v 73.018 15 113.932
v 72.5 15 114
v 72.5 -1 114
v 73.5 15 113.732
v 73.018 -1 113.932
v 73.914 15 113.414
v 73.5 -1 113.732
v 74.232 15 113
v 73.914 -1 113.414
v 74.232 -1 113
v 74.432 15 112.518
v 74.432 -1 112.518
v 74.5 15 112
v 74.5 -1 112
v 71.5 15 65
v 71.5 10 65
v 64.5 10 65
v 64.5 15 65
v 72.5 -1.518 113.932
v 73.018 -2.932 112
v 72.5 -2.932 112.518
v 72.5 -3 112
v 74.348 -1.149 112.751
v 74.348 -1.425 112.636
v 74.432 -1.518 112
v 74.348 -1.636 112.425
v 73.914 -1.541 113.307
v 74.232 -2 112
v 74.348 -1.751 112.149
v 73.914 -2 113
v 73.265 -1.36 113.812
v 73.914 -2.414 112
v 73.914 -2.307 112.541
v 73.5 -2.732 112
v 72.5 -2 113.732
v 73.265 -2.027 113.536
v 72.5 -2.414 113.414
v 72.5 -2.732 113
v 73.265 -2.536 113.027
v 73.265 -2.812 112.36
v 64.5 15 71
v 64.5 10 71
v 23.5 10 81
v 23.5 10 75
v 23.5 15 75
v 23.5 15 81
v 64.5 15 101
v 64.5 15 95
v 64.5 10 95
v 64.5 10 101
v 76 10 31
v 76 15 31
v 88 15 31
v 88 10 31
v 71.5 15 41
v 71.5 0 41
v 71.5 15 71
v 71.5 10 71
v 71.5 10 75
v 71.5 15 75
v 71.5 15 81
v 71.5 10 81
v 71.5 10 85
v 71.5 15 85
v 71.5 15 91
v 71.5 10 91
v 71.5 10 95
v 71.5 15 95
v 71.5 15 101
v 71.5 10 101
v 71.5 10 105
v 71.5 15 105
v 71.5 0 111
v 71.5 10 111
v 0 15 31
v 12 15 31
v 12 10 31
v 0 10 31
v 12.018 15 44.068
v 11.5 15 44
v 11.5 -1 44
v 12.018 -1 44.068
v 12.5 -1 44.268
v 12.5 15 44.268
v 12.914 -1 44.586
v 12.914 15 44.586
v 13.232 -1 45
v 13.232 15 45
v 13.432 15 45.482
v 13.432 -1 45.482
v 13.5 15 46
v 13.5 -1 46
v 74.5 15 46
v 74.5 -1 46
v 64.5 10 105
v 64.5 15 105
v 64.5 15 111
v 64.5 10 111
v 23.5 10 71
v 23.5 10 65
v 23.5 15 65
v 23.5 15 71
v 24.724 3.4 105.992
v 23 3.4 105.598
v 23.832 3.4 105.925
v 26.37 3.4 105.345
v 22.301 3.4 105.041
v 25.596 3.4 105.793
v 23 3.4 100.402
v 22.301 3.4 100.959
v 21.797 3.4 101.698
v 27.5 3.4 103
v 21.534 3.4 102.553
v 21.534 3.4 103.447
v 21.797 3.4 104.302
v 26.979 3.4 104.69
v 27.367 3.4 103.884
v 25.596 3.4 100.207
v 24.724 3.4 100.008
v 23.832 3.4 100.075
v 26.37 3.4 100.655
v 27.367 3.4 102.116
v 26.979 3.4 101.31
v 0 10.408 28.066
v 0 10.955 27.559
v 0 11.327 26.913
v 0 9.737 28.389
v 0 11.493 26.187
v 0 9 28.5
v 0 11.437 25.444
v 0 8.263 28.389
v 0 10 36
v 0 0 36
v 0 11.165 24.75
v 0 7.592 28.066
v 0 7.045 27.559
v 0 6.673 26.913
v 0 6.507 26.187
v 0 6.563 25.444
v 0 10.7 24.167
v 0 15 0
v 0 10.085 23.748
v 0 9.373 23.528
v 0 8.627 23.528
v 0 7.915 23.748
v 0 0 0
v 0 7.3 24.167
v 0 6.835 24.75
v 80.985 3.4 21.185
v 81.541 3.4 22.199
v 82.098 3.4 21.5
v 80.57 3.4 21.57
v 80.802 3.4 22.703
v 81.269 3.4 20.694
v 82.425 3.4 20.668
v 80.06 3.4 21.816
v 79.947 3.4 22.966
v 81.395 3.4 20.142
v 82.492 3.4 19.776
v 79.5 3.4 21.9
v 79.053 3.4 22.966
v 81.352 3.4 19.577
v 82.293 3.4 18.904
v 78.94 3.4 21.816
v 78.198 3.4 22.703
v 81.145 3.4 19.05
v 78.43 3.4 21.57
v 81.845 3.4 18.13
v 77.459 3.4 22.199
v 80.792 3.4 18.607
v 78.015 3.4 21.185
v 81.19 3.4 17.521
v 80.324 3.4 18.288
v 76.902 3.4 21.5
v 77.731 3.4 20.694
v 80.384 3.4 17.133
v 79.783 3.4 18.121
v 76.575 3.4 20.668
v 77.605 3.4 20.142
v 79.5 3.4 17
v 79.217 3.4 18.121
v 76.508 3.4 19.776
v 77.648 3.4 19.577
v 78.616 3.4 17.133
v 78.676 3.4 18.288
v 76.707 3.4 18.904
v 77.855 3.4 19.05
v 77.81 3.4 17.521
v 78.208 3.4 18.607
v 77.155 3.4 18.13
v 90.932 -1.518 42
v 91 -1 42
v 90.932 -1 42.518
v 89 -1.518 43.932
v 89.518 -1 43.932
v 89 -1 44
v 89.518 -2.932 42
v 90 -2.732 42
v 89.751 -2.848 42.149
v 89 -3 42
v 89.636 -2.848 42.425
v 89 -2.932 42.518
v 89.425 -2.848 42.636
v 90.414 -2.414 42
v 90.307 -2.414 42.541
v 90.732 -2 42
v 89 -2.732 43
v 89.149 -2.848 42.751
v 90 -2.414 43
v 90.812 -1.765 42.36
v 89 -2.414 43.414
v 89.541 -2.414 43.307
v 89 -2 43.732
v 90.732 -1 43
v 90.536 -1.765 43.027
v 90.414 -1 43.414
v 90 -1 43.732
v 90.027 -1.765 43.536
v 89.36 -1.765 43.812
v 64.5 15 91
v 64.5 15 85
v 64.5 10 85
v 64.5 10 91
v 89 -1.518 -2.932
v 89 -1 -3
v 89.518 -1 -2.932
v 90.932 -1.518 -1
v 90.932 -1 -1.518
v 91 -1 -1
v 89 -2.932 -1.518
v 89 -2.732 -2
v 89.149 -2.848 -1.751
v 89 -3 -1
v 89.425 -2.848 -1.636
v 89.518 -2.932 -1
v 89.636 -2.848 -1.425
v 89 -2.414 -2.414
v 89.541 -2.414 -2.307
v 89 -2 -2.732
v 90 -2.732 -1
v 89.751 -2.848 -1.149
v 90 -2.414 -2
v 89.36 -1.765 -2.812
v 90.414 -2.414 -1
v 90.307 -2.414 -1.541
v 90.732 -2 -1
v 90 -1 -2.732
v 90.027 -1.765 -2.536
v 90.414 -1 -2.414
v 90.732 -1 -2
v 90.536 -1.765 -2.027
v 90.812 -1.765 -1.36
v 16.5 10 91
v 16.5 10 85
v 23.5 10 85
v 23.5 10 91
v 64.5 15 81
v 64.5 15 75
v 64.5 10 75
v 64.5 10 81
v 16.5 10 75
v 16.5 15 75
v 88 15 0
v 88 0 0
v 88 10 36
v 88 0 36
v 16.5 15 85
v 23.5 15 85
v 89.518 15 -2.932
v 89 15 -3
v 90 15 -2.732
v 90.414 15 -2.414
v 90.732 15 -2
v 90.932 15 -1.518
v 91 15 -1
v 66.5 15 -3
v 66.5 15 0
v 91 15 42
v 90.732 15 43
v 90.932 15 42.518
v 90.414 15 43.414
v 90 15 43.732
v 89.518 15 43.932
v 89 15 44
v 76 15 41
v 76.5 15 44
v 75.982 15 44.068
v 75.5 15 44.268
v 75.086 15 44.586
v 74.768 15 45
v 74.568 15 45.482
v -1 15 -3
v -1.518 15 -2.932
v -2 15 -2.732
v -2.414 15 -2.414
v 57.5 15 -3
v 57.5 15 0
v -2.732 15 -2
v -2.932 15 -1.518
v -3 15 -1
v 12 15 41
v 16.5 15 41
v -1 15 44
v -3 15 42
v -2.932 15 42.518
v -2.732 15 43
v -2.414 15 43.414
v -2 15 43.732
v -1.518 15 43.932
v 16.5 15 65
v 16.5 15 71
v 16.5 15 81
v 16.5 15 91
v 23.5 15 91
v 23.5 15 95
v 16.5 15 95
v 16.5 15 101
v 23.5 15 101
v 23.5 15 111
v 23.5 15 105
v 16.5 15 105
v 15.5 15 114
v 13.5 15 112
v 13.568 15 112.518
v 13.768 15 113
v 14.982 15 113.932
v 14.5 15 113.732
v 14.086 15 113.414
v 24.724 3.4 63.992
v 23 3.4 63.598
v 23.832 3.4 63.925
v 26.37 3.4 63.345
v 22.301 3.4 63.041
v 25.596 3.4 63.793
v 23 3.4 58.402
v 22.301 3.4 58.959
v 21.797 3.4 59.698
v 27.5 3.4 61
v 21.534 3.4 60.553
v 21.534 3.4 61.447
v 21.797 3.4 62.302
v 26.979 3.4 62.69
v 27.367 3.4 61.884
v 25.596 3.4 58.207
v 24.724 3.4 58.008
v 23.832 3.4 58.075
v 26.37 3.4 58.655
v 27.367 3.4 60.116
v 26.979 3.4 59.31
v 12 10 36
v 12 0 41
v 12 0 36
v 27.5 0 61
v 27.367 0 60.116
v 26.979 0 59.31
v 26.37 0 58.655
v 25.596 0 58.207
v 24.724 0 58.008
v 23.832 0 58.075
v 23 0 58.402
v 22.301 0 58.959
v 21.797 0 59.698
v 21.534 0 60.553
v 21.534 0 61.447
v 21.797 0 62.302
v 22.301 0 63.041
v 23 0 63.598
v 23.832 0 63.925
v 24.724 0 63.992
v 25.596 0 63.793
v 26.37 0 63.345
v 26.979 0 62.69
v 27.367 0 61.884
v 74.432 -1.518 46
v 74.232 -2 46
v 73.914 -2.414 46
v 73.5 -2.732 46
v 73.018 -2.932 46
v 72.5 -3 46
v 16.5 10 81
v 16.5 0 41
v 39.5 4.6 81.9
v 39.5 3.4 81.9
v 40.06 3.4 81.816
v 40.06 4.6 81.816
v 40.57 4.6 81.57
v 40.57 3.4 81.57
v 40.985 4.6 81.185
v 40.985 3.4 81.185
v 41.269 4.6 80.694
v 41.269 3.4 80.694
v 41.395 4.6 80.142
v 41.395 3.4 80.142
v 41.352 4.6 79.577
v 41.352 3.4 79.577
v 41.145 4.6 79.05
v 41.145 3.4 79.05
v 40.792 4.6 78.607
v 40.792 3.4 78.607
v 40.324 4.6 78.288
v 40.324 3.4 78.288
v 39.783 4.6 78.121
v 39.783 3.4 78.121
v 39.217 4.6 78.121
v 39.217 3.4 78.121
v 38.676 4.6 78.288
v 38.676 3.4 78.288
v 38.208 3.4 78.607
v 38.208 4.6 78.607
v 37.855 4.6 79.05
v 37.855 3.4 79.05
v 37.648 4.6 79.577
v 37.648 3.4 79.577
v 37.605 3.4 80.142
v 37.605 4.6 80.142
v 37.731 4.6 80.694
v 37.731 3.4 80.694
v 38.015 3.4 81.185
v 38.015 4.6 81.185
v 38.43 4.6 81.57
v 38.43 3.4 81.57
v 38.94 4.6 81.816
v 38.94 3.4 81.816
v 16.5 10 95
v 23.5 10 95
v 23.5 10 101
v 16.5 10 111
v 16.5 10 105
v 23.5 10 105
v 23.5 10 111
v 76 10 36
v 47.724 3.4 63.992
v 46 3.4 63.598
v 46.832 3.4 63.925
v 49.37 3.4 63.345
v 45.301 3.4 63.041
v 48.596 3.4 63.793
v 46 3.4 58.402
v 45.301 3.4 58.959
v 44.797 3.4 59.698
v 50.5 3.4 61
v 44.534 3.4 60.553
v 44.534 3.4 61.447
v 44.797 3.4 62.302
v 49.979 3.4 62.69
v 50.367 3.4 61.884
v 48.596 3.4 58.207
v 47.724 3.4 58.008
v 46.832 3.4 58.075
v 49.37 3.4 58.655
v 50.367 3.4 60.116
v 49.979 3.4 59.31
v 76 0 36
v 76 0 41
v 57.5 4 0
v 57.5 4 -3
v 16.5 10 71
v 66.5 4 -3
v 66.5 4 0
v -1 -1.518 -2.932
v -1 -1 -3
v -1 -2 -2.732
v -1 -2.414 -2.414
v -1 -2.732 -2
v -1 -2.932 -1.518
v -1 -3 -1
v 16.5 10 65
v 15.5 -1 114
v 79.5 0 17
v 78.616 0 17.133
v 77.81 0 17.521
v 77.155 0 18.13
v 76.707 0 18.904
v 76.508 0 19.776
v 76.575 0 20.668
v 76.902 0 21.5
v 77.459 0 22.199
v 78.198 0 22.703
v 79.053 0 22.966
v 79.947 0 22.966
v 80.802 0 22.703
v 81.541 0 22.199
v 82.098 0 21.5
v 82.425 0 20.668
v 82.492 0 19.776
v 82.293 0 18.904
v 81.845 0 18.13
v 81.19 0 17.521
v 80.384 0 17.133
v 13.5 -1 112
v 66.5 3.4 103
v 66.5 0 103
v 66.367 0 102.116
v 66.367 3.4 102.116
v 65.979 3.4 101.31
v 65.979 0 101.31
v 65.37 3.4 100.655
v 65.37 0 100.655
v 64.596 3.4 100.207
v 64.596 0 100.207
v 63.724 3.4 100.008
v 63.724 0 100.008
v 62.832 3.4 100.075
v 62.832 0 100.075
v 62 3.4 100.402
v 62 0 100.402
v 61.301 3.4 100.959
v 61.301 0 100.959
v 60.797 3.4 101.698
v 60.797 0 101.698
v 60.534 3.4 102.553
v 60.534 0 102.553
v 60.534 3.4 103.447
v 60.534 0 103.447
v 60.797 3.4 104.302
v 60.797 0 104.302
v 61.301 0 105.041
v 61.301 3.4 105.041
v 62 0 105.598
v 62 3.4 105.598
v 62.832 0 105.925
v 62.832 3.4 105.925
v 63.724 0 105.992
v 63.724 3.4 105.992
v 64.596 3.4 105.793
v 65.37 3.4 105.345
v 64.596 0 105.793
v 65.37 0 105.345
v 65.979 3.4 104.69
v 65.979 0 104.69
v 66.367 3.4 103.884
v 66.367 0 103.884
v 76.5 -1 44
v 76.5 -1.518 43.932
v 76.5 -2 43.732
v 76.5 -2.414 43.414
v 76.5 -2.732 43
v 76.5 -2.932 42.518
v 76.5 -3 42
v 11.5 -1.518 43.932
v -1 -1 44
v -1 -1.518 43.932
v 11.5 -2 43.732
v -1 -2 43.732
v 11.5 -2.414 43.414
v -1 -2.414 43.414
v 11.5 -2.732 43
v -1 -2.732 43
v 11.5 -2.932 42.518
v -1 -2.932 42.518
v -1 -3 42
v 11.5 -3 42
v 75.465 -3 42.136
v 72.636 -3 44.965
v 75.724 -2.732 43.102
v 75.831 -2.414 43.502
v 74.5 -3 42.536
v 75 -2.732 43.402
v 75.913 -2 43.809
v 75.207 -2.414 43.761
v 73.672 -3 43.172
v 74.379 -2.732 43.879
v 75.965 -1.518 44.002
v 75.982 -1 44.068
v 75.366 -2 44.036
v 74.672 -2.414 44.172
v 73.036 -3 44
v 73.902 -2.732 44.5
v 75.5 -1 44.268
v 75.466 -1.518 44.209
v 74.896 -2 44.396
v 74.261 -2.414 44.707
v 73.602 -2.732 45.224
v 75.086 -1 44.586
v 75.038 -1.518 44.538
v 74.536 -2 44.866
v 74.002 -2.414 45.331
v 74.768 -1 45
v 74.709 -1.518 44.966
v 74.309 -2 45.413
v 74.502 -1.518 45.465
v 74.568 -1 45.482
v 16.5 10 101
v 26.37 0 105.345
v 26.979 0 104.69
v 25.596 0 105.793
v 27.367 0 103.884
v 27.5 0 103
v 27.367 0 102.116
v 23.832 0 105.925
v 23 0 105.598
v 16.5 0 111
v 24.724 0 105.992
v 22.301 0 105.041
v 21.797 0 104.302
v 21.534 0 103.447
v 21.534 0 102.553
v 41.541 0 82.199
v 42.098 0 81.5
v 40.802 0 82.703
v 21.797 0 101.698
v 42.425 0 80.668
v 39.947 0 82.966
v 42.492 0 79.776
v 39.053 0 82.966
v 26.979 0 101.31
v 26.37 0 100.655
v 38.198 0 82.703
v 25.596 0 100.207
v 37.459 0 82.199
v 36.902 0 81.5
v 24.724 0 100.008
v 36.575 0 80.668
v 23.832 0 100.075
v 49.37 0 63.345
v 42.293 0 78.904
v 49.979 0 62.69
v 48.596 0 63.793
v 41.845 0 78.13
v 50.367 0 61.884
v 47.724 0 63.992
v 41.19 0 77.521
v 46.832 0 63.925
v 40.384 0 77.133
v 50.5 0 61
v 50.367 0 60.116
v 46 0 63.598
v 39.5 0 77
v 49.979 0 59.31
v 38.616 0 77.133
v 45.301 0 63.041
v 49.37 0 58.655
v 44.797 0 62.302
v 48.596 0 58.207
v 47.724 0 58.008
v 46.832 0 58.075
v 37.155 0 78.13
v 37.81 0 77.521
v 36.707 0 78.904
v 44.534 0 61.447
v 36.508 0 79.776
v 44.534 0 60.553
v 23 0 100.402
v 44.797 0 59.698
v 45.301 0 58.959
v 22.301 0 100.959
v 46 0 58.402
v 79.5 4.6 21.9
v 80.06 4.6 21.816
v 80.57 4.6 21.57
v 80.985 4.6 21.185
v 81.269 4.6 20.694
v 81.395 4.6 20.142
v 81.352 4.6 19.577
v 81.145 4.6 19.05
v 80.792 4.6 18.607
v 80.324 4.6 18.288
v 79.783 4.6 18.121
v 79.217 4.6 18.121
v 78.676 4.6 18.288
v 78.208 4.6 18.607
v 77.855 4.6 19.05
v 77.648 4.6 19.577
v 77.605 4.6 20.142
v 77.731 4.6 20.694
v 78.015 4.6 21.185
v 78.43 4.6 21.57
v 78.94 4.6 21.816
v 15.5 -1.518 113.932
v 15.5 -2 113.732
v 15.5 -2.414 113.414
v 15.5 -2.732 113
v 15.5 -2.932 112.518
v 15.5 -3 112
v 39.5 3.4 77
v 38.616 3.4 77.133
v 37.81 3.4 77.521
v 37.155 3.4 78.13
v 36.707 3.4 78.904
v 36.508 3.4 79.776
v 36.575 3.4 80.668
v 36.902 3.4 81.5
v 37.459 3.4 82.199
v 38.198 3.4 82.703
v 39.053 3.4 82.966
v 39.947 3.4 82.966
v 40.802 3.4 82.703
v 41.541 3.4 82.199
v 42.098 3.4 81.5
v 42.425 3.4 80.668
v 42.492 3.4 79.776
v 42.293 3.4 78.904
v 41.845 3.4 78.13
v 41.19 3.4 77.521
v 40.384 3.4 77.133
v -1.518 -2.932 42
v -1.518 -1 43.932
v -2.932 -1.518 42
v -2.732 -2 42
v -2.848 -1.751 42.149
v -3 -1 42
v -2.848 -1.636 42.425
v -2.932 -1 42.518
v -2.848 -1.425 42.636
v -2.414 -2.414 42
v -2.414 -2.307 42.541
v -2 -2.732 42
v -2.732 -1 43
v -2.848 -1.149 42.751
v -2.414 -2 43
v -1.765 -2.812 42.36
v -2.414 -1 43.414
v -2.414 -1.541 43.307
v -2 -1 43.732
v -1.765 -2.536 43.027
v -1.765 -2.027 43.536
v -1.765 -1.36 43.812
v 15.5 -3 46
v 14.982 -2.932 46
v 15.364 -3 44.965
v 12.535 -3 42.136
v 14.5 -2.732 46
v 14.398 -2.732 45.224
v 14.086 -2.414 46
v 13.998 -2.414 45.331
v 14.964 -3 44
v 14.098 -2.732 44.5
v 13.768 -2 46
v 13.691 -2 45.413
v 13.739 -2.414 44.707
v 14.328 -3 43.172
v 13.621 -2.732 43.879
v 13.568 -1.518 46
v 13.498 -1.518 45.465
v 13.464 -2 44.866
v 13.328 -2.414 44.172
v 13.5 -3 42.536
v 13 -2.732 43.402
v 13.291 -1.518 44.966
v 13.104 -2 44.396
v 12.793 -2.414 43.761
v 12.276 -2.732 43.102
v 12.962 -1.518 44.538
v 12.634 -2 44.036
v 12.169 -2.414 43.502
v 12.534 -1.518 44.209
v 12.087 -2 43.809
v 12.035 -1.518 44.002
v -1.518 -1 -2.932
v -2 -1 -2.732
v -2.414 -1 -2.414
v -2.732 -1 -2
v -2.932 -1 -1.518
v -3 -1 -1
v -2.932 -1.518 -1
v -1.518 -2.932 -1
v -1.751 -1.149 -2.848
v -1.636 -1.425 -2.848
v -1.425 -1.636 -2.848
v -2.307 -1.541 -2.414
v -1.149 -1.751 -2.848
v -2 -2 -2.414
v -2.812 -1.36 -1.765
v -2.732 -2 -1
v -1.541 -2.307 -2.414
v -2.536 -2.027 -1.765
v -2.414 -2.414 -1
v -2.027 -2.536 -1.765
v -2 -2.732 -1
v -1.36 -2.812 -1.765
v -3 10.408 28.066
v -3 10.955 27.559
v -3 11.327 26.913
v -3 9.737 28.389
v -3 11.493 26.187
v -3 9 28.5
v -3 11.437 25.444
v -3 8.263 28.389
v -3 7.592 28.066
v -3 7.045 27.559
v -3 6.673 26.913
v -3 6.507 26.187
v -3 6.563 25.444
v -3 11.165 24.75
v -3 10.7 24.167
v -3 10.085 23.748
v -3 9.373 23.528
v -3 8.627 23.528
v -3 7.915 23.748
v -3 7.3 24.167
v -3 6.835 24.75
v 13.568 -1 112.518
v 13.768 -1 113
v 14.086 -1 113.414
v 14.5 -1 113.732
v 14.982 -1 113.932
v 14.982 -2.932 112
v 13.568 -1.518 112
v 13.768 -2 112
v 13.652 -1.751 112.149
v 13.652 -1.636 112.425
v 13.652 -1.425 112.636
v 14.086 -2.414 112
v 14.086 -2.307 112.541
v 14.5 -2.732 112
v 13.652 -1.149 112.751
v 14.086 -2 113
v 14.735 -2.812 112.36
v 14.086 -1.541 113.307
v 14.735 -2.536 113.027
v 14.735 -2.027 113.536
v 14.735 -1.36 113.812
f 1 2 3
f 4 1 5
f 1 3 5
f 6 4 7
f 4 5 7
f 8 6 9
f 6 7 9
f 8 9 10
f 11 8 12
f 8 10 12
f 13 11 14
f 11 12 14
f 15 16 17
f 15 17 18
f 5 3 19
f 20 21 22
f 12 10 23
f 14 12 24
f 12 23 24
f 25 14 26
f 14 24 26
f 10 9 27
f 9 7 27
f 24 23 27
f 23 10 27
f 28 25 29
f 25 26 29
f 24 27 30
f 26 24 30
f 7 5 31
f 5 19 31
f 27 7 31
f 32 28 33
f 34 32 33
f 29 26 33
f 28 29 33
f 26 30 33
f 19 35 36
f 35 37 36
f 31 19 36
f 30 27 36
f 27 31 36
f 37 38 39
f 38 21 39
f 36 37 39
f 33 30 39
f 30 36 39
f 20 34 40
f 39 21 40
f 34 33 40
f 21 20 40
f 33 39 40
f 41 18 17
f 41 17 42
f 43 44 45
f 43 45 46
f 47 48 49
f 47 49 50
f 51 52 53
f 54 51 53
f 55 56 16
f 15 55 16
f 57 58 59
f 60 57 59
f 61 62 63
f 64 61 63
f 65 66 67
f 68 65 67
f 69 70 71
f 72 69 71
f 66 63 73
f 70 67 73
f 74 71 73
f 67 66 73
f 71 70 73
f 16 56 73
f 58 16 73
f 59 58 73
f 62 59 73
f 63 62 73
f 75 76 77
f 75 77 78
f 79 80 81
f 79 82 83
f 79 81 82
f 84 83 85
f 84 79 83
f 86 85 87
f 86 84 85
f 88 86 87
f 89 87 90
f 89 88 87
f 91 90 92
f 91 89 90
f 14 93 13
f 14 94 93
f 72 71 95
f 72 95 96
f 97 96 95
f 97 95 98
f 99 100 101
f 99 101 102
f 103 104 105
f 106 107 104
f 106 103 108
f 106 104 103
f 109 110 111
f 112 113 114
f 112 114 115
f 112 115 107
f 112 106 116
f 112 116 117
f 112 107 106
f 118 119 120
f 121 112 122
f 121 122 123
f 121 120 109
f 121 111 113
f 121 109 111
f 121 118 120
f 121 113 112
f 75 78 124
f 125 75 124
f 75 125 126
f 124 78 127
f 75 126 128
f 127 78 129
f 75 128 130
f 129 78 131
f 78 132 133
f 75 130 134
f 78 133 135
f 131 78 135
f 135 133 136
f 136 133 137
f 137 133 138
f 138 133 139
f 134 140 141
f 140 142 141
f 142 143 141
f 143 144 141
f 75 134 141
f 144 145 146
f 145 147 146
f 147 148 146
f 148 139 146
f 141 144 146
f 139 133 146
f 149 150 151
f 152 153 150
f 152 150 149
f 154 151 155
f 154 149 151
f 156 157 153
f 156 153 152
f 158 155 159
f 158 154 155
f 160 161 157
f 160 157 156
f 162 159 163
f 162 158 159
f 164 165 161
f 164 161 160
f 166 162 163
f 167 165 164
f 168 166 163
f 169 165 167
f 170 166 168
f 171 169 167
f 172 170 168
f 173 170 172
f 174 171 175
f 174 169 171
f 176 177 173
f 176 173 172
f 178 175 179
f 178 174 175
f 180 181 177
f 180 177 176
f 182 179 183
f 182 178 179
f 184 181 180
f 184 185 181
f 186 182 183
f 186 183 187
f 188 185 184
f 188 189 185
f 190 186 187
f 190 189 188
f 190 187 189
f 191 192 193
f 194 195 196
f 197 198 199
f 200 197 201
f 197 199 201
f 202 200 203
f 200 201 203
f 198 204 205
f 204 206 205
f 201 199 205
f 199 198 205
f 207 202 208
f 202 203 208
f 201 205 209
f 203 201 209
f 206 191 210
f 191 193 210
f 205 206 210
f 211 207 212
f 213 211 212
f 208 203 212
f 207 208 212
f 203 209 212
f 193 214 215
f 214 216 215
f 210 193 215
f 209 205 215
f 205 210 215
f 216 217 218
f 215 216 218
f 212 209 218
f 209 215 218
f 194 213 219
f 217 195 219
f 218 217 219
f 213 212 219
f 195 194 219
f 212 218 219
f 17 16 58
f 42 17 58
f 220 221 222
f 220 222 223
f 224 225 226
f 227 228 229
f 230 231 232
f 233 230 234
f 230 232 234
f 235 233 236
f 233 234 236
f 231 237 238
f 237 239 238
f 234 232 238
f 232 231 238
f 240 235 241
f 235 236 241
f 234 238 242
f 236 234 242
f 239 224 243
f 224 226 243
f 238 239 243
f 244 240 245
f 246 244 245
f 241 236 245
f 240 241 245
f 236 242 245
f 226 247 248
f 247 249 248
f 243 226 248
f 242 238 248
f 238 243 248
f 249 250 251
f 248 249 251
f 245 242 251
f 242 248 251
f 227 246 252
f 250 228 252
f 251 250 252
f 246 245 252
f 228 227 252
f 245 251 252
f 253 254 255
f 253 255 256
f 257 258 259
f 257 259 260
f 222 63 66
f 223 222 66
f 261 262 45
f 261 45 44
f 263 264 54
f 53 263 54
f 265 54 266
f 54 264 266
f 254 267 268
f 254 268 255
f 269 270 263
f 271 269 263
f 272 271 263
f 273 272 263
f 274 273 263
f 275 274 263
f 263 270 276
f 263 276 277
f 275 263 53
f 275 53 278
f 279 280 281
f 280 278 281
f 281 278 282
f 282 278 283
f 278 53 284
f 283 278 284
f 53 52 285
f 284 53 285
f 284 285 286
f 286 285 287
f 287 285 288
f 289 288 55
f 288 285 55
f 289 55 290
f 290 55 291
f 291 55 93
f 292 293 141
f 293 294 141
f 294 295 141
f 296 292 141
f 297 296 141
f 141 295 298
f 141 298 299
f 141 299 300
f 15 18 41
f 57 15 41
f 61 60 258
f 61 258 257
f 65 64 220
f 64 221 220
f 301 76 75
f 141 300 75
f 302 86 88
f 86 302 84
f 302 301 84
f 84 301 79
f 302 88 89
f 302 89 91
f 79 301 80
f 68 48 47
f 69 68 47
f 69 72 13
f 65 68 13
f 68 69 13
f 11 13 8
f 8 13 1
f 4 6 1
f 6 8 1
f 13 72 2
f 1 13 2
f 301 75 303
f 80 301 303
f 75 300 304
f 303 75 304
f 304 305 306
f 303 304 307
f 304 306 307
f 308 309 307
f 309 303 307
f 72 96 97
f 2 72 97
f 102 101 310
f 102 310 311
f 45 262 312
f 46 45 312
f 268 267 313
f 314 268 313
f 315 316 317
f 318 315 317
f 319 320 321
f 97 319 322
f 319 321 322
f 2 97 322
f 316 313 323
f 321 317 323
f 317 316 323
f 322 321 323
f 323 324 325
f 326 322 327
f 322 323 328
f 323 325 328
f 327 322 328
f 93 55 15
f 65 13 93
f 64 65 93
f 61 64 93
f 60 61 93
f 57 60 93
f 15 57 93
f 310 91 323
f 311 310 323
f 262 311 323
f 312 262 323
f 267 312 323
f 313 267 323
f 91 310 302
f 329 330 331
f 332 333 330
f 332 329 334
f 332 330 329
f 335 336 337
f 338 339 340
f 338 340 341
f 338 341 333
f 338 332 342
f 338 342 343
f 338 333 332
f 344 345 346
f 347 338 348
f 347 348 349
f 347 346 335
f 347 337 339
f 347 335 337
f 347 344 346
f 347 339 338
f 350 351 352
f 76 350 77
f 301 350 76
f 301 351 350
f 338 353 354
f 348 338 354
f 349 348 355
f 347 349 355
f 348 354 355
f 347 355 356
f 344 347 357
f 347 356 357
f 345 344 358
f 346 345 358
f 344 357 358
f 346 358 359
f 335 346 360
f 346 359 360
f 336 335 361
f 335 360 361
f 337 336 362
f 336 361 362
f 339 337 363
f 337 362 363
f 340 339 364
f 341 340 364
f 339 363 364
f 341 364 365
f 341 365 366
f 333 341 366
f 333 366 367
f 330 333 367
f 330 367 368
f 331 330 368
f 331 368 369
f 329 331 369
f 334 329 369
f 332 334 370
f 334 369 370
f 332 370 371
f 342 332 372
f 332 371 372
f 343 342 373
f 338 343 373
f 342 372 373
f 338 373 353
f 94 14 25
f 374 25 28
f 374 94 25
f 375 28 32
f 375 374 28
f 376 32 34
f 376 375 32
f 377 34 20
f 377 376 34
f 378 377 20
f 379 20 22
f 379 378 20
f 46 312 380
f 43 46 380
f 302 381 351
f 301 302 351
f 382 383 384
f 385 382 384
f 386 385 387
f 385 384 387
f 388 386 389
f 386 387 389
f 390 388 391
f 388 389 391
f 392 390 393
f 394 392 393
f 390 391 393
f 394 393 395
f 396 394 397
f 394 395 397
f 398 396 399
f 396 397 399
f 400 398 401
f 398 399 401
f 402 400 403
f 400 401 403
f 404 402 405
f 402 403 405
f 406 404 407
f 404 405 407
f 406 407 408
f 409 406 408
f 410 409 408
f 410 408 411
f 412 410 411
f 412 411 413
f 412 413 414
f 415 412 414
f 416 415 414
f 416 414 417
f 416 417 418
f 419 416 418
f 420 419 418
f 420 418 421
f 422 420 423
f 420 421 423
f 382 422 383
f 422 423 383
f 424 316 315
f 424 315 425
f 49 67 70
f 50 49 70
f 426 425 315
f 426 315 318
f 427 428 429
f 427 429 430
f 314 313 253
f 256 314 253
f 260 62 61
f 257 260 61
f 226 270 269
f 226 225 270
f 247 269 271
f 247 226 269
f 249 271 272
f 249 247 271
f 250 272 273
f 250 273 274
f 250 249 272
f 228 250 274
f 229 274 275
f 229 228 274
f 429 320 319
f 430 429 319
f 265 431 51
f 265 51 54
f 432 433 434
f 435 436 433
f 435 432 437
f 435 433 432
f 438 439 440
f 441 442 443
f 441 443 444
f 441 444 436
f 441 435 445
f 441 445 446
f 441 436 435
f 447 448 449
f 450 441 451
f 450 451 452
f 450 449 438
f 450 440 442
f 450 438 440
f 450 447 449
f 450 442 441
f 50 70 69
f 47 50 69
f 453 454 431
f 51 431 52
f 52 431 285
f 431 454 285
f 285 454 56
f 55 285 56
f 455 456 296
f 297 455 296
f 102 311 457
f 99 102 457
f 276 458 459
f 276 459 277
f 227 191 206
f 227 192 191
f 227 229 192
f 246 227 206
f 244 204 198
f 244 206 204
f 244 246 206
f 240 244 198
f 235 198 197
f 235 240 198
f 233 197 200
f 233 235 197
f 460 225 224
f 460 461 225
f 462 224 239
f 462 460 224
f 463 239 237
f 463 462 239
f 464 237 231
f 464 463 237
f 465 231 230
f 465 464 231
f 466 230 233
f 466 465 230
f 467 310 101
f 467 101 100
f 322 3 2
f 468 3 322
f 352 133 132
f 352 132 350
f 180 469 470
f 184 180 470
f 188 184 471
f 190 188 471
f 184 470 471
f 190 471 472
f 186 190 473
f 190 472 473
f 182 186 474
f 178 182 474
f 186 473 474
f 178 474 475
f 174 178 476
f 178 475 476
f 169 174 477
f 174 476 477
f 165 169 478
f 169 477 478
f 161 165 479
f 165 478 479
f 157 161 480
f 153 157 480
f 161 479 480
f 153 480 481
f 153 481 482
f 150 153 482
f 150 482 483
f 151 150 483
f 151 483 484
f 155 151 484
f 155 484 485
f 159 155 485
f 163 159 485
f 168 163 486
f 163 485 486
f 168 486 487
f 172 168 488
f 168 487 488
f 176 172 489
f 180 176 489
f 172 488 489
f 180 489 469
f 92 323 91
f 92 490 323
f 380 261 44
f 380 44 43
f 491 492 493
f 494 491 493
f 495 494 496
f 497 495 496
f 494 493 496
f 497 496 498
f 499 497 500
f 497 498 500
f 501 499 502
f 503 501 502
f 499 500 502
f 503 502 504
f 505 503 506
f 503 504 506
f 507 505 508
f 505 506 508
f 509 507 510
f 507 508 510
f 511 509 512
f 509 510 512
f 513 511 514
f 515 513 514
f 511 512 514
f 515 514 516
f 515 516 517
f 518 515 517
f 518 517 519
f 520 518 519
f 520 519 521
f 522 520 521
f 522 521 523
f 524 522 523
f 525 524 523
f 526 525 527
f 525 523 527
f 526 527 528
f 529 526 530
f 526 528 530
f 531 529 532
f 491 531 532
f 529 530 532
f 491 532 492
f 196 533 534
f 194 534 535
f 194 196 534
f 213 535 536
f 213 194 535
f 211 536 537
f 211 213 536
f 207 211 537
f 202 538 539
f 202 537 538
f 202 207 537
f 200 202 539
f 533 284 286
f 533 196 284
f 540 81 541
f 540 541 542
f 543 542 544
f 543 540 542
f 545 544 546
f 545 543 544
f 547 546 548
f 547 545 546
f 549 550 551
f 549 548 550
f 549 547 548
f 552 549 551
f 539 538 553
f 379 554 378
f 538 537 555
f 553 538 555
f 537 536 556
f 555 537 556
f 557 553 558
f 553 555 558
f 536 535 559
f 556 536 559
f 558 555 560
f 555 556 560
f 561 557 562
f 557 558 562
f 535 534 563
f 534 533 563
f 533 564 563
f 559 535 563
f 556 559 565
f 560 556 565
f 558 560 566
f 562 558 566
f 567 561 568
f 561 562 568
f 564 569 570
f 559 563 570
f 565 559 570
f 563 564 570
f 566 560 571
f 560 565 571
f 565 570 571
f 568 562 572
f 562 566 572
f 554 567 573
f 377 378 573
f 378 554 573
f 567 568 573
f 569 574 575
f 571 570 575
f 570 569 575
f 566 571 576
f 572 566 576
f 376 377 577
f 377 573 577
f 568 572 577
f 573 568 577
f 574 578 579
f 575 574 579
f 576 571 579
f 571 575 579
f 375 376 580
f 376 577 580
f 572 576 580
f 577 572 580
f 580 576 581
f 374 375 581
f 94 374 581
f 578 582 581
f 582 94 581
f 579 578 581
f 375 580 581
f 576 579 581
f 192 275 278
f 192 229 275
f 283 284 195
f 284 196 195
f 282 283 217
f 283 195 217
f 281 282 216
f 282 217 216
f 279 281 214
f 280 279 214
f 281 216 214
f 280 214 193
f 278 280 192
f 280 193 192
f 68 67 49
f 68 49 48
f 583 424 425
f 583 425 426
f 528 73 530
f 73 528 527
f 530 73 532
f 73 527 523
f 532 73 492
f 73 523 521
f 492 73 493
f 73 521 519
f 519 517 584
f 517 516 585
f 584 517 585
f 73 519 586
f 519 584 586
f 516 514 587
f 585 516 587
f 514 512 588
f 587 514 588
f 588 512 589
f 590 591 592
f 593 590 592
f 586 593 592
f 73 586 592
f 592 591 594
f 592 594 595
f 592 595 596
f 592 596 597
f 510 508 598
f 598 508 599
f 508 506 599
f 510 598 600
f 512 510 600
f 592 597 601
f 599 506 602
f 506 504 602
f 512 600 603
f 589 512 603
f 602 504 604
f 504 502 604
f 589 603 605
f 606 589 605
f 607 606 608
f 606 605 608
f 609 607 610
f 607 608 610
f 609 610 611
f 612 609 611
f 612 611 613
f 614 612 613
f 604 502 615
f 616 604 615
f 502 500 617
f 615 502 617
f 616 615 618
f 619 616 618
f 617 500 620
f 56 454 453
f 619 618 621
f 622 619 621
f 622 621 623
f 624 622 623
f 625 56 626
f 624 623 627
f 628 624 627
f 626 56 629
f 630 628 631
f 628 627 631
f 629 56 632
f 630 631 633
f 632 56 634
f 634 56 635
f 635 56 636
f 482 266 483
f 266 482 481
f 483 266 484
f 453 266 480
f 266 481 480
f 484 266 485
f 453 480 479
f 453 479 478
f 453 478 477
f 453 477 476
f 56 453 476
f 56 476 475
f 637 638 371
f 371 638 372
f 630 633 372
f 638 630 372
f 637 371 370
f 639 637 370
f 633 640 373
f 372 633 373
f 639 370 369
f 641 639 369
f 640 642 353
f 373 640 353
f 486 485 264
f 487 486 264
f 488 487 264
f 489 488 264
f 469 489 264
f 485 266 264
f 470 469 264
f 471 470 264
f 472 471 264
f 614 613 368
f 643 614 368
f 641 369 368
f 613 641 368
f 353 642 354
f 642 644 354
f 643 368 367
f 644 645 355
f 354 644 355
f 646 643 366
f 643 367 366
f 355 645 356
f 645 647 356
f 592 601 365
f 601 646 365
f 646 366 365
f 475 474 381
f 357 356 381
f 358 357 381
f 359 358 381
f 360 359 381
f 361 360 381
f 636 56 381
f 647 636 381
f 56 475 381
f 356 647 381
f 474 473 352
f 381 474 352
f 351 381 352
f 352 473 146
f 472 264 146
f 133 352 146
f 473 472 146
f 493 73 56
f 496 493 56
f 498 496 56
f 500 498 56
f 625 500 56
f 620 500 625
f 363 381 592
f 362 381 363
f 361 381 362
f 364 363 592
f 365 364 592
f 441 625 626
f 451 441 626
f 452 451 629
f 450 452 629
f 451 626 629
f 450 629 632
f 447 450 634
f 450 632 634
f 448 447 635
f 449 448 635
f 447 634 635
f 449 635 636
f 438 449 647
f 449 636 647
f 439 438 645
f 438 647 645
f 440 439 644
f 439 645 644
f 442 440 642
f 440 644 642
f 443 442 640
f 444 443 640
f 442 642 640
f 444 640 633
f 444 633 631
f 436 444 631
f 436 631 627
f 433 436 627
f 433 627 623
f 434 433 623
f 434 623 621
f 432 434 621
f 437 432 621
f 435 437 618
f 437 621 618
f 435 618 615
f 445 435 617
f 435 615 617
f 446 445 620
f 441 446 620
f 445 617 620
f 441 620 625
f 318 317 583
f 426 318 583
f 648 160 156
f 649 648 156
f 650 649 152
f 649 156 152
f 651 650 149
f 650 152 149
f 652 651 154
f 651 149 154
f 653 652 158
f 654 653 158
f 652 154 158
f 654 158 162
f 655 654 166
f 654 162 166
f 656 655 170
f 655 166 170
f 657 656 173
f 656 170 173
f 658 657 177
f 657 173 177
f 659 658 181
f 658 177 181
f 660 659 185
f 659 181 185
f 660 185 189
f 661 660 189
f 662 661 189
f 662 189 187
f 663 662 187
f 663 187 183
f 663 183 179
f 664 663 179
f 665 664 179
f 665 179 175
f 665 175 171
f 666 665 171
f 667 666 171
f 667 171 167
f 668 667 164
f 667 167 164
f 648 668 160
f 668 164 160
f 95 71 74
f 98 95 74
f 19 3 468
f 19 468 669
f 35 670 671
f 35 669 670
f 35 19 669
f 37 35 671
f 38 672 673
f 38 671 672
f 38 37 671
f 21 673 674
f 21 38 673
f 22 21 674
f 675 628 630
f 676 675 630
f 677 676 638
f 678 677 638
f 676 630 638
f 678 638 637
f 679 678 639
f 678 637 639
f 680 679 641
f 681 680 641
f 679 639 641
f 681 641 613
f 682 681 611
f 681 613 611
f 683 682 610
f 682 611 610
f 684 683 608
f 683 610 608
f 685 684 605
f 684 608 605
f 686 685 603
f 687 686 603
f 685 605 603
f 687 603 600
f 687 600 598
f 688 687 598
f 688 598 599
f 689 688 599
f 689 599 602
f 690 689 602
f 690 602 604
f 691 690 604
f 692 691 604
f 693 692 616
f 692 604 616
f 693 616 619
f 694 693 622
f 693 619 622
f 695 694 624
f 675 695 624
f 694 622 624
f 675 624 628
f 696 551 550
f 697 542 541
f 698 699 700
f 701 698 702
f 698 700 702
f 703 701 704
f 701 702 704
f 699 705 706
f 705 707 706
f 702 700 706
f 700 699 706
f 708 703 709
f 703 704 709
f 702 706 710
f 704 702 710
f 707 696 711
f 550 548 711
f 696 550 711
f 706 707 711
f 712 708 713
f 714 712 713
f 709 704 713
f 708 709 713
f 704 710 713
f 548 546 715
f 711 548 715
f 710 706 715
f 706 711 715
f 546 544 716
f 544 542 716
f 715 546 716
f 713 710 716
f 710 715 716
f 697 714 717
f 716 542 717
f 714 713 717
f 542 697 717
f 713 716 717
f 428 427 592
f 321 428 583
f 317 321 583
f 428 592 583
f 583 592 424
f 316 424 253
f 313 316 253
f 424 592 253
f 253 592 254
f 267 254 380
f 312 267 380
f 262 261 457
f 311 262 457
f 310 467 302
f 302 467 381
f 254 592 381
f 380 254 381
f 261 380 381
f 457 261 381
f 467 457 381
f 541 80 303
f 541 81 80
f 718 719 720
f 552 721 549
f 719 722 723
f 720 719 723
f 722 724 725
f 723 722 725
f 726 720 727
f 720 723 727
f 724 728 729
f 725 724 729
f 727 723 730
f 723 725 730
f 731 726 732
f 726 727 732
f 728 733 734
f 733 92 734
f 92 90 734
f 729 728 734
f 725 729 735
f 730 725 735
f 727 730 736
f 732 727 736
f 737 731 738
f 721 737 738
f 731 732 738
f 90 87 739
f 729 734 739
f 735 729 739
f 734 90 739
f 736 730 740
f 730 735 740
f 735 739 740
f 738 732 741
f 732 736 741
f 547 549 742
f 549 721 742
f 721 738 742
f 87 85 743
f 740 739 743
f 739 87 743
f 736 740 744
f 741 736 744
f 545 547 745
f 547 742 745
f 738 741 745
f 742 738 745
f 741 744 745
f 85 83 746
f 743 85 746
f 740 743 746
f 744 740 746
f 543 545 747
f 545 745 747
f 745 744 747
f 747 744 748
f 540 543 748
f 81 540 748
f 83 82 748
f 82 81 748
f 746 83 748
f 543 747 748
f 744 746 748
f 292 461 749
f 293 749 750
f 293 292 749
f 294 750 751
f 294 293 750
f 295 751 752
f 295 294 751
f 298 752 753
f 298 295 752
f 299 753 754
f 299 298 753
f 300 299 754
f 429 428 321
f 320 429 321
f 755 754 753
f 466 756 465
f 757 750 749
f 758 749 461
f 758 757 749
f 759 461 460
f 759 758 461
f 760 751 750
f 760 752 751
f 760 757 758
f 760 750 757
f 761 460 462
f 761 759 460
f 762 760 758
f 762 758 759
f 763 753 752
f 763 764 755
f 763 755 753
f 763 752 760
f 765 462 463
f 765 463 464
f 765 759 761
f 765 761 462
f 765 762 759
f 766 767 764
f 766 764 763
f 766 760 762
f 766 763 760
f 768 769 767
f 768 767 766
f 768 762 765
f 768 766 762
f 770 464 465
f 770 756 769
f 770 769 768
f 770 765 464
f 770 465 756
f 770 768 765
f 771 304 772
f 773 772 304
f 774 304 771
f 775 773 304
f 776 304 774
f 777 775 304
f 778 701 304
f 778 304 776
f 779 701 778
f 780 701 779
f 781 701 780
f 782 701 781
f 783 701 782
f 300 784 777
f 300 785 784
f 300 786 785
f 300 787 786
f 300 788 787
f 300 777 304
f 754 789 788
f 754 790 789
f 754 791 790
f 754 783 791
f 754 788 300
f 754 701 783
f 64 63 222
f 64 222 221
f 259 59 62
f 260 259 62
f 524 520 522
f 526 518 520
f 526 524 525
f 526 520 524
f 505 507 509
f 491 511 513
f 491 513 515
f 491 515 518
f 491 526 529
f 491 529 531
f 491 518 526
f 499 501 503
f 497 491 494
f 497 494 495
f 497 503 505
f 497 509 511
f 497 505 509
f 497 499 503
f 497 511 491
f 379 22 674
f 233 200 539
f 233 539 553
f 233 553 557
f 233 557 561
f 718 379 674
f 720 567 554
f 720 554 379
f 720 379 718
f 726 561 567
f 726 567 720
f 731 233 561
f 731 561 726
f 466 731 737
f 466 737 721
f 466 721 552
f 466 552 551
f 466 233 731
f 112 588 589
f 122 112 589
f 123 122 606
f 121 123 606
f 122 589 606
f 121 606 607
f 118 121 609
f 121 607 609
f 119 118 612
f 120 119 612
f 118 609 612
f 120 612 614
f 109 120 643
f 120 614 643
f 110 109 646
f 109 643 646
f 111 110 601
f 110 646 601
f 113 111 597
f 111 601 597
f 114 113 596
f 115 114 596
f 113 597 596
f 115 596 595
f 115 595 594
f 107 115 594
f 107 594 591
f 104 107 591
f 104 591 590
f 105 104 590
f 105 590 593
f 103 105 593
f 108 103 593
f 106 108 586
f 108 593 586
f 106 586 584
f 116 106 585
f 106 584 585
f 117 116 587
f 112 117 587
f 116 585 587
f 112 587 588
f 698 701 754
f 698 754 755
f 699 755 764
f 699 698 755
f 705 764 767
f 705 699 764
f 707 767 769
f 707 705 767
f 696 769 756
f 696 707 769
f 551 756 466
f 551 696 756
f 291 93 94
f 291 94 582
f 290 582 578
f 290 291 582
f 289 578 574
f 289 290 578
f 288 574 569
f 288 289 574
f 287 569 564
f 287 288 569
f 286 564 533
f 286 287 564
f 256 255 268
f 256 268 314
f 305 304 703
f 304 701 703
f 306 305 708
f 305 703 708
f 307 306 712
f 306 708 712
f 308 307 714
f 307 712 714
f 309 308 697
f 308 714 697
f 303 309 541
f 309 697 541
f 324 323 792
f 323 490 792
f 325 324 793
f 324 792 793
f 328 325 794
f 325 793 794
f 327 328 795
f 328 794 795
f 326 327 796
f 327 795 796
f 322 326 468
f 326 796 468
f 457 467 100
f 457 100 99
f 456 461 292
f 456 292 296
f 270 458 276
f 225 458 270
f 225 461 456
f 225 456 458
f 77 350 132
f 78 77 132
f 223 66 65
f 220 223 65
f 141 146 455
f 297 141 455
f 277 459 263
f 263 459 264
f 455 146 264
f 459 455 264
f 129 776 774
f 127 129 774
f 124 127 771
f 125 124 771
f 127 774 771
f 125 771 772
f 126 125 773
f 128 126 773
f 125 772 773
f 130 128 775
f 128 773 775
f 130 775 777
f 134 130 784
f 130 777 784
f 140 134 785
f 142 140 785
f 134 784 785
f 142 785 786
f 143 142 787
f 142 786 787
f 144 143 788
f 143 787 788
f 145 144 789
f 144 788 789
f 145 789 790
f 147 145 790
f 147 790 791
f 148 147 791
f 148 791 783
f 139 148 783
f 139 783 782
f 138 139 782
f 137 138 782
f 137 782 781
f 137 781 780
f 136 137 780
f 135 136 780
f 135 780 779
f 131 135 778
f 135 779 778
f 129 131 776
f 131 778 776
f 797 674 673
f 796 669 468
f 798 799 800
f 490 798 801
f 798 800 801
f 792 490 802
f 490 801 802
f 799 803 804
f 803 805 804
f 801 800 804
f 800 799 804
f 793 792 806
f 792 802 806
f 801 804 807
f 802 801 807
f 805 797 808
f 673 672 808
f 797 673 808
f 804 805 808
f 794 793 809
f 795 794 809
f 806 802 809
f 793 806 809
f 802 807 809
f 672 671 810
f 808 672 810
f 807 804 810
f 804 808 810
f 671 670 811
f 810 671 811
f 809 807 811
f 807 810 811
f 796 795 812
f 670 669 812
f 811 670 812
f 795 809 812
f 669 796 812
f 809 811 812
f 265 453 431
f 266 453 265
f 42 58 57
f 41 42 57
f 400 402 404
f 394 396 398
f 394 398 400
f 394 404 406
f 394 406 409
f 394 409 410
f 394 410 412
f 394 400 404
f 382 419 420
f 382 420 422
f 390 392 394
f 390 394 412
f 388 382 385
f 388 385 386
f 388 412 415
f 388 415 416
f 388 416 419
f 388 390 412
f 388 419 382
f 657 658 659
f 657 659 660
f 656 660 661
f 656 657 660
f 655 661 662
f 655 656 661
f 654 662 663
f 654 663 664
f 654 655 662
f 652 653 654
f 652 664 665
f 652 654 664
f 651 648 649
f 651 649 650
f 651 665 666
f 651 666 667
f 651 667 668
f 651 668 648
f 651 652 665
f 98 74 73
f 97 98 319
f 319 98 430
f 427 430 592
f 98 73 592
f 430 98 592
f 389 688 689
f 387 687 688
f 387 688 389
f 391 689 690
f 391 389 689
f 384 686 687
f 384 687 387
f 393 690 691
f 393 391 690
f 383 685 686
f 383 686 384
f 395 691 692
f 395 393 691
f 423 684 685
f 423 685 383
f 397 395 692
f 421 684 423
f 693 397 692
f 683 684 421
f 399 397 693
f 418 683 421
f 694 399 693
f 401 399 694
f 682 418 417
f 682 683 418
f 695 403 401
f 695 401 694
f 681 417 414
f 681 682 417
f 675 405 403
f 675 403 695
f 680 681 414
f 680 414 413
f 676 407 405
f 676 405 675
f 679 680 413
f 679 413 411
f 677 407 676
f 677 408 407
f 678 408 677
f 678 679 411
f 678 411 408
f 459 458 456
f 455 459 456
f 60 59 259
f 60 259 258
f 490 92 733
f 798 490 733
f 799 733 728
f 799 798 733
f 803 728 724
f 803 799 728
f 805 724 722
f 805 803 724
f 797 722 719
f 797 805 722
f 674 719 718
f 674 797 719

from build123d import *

# Parameters (mm, degrees)
BOSS_EXTRUDE1_DEPTH       = 15
SHELL1_T                  = 3
SKETCH3_W                 = 9
SKETCH3_H                 = 11
CUT_EXTRUDE1_DEPTH        = 3
SKETCH4_R                 = 2.5
CUT_EXTRUDE2_DEPTH        = 3
FILLET1_R                 = 2
SKETCH5_R                 = 3
BOSS_EXTRUDE2_DEPTH       = 3.4
SKETCH6_R                 = 1.9
BOSS_EXTRUDE3_DEPTH       = 1.2
SKETCH_PATTERN1_OUTLINE_R = 3
SKETCH_PATTERN1_DEPTH     = 3.4
SKETCH9_W                 = 12
SKETCH9_H                 = 5
BOSS_EXTRUDE4_DEPTH       = 15
SKETCH10_W                = 12
SKETCH10_H                = 5
BOSS_EXTRUDE5_DEPTH       = 5
SKETCH11_W                = 6
SKETCH11_H                = 5
BOSS_EXTRUDE6_DEPTH       = 7
LPATTERN1_COUNT           = 5
LPATTERN1_PITCH           = 10
MIRROR2_COPY_1_SKETCH_W   = 6
MIRROR2_COPY_1_SKETCH_H   = 5
MIRROR2_COPY_1_DEPTH      = 7
MIRROR2_COPY_2_SKETCH_W   = 6
MIRROR2_COPY_2_SKETCH_H   = 5
MIRROR2_COPY_2_DEPTH      = 7
MIRROR2_COPY_3_SKETCH_W   = 6
MIRROR2_COPY_3_SKETCH_H   = 5
MIRROR2_COPY_3_DEPTH      = 7
MIRROR2_COPY_4_SKETCH_W   = 6
MIRROR2_COPY_4_SKETCH_H   = 5
MIRROR2_COPY_4_DEPTH      = 7


# Read off the part's stored shape, not the designer's step: Sketch-Pattern1
with BuildPart() as part:
    # Sketch1 → Boss-Extrude1 (new body)
    with BuildSketch(Plane(origin=(0, 0, 0), x_dir=(1, 0, 0), z_dir=(0, 1, 0))):
        Polygon((0, 0), (88, 0), (88, -41), (71.5, -41), (71.5, -111), (16.5, -111), (16.5, -41), (0, -41), align=None)
    extrude(amount=BOSS_EXTRUDE1_DEPTH)

    # Shell1
    shell1_openings = [part.faces().sort_by_distance(p)[0] for p in [
        (44, 15, 49.150442478),
    ]]
    offset(amount=SHELL1_T, openings=shell1_openings, kind=Kind.INTERSECTION)

    # Sketch3 → Cut-Extrude1 (cut)
    with BuildSketch(Plane(origin=(0, 0, -3), x_dir=(-1, 0, 0), z_dir=(0, 0, -1))):
        with Locations((-62, 9.5)):
            Rectangle(SKETCH3_W, SKETCH3_H)
    extrude(amount=-CUT_EXTRUDE1_DEPTH, mode=Mode.SUBTRACT)

    # Sketch4 → Cut-Extrude2 (cut)
    with BuildSketch(Plane.ZY.offset(3)):
        with Locations((26, 9)):
            Circle(SKETCH4_R)
    extrude(amount=-CUT_EXTRUDE2_DEPTH, mode=Mode.SUBTRACT)

    # Fillet1
    fillet1_edges = [part.edges().sort_by_distance(p)[0] for p in [
        (44, -3, 114),
        (13.5, -3, 79),
        (5.25, -3, 44),
        (-3, -3, 20.5),
        (-3, 6, -3),
        (91, 6, -3),
        (91, 6, 44),
        (74.5, 6, 44),
        (74.5, 6, 114),
        (13.5, 6, 114),
        (13.5, 6, 44),
        (-3, 6, 44),
        (44, -3, -3),
        (91, -3, 20.5),
        (82.75, -3, 44),
        (74.5, -3, 79),
    ]]
    fillet(fillet1_edges, radius=FILLET1_R)

    # Sketch5 → Boss-Extrude2 (add)
    with BuildSketch(Plane(origin=(0, 0, 0), x_dir=(1, 0, 0), z_dir=(0, 1, 0))):
        with Locations(Location((39.5, -80, 0), (0, 0, 90))):
            Circle(SKETCH5_R)
        with Locations(Location((79.5, -20, 0), (0, 0, 90))):
            Circle(SKETCH5_R)
    extrude(amount=BOSS_EXTRUDE2_DEPTH)

    # Sketch6 → Boss-Extrude3 (add)
    with BuildSketch(Plane(origin=(0, 3.4, 0), x_dir=(1, 0, 0), z_dir=(0, 1, 0))):
        with Locations(Location((39.5, -80, 0), (0, 0, 270))):
            Circle(SKETCH6_R)
        with Locations(Location((79.5, -20, 0), (0, 0, 270))):
            Circle(SKETCH6_R)
    extrude(amount=BOSS_EXTRUDE3_DEPTH)

    # Sketch-Pattern1 outline → Sketch-Pattern1 (add)
    with BuildSketch(Plane(origin=(0, 0, 0), x_dir=(1, 0, 0), z_dir=(0, 1, 0))):
        with Locations((63.5, -103)):
            Circle(SKETCH_PATTERN1_OUTLINE_R)
        with Locations((24.5, -103)):
            Circle(SKETCH_PATTERN1_OUTLINE_R)
        with Locations((24.5, -61)):
            Circle(SKETCH_PATTERN1_OUTLINE_R)
        with Locations((47.5, -61)):
            Circle(SKETCH_PATTERN1_OUTLINE_R)
    extrude(amount=SKETCH_PATTERN1_DEPTH)

    # Sketch9 → Boss-Extrude4 (add)
    with BuildSketch(Plane(origin=(0, 0, 0), x_dir=(1, 0, 0), z_dir=(0, 1, 0))):
        with Locations((6, -38.5)):
            Rectangle(SKETCH9_W, SKETCH9_H)
        with Locations((82, -38.5)):
            Rectangle(SKETCH9_W, SKETCH9_H)
    extrude(amount=BOSS_EXTRUDE4_DEPTH)

    # Sketch10 → Boss-Extrude5 (add)
    with BuildSketch(Plane(origin=(0, 0, 36), x_dir=(-1, 0, 0), z_dir=(0, 0, -1))):
        with Locations((-6, 12.5)):
            Rectangle(SKETCH10_W, SKETCH10_H)
    boss_extrude5 = extrude(amount=BOSS_EXTRUDE5_DEPTH)

    # Mirror1: Boss-Extrude5 across plane
    add(boss_extrude5.mirror(Plane.ZY.offset(-44)))

    # Sketch11 → Boss-Extrude6 (add)
    with BuildSketch(Plane.ZY.offset(-71.5)):
        with Locations((108, 12.5)):
            Rectangle(SKETCH11_W, SKETCH11_H)
    boss_extrude6 = extrude(amount=BOSS_EXTRUDE6_DEPTH)

    # LPattern1: Boss-Extrude6 ×5
    with Locations(*[(0, 0, -i * LPATTERN1_PITCH) for i in range(1, LPATTERN1_COUNT)]):
        add(boss_extrude6)

    # Mirror2: Boss-Extrude6 across plane
    add(boss_extrude6.mirror(Plane.ZY.offset(-44)))

    # Mirror2 copy 1 sketch → Mirror2 copy 1 (add)
    with BuildSketch(Plane(origin=(16.5, 0, -10), x_dir=(0, 0, 1), z_dir=(1, 0, 0))):
        with Locations((108, -12.5)):
            Rectangle(MIRROR2_COPY_1_SKETCH_W, MIRROR2_COPY_1_SKETCH_H)
    extrude(amount=MIRROR2_COPY_1_DEPTH)

    # Mirror2 copy 2 sketch → Mirror2 copy 2 (add)
    with BuildSketch(Plane(origin=(16.5, 0, -20), x_dir=(0, 0, 1), z_dir=(1, 0, 0))):
        with Locations((108, -12.5)):
            Rectangle(MIRROR2_COPY_2_SKETCH_W, MIRROR2_COPY_2_SKETCH_H)
    extrude(amount=MIRROR2_COPY_2_DEPTH)

    # Mirror2 copy 3 sketch → Mirror2 copy 3 (add)
    with BuildSketch(Plane(origin=(16.5, 0, -30), x_dir=(0, 0, 1), z_dir=(1, 0, 0))):
        with Locations((108, -12.5)):
            Rectangle(MIRROR2_COPY_3_SKETCH_W, MIRROR2_COPY_3_SKETCH_H)
    extrude(amount=MIRROR2_COPY_3_DEPTH)

    # Mirror2 copy 4 sketch → Mirror2 copy 4 (add)
    with BuildSketch(Plane(origin=(16.5, 0, -40), x_dir=(0, 0, 1), z_dir=(1, 0, 0))):
        with Locations((108, -12.5)):
            Rectangle(MIRROR2_COPY_4_SKETCH_W, MIRROR2_COPY_4_SKETCH_H)
    extrude(amount=MIRROR2_COPY_4_DEPTH)


solid = part.part
